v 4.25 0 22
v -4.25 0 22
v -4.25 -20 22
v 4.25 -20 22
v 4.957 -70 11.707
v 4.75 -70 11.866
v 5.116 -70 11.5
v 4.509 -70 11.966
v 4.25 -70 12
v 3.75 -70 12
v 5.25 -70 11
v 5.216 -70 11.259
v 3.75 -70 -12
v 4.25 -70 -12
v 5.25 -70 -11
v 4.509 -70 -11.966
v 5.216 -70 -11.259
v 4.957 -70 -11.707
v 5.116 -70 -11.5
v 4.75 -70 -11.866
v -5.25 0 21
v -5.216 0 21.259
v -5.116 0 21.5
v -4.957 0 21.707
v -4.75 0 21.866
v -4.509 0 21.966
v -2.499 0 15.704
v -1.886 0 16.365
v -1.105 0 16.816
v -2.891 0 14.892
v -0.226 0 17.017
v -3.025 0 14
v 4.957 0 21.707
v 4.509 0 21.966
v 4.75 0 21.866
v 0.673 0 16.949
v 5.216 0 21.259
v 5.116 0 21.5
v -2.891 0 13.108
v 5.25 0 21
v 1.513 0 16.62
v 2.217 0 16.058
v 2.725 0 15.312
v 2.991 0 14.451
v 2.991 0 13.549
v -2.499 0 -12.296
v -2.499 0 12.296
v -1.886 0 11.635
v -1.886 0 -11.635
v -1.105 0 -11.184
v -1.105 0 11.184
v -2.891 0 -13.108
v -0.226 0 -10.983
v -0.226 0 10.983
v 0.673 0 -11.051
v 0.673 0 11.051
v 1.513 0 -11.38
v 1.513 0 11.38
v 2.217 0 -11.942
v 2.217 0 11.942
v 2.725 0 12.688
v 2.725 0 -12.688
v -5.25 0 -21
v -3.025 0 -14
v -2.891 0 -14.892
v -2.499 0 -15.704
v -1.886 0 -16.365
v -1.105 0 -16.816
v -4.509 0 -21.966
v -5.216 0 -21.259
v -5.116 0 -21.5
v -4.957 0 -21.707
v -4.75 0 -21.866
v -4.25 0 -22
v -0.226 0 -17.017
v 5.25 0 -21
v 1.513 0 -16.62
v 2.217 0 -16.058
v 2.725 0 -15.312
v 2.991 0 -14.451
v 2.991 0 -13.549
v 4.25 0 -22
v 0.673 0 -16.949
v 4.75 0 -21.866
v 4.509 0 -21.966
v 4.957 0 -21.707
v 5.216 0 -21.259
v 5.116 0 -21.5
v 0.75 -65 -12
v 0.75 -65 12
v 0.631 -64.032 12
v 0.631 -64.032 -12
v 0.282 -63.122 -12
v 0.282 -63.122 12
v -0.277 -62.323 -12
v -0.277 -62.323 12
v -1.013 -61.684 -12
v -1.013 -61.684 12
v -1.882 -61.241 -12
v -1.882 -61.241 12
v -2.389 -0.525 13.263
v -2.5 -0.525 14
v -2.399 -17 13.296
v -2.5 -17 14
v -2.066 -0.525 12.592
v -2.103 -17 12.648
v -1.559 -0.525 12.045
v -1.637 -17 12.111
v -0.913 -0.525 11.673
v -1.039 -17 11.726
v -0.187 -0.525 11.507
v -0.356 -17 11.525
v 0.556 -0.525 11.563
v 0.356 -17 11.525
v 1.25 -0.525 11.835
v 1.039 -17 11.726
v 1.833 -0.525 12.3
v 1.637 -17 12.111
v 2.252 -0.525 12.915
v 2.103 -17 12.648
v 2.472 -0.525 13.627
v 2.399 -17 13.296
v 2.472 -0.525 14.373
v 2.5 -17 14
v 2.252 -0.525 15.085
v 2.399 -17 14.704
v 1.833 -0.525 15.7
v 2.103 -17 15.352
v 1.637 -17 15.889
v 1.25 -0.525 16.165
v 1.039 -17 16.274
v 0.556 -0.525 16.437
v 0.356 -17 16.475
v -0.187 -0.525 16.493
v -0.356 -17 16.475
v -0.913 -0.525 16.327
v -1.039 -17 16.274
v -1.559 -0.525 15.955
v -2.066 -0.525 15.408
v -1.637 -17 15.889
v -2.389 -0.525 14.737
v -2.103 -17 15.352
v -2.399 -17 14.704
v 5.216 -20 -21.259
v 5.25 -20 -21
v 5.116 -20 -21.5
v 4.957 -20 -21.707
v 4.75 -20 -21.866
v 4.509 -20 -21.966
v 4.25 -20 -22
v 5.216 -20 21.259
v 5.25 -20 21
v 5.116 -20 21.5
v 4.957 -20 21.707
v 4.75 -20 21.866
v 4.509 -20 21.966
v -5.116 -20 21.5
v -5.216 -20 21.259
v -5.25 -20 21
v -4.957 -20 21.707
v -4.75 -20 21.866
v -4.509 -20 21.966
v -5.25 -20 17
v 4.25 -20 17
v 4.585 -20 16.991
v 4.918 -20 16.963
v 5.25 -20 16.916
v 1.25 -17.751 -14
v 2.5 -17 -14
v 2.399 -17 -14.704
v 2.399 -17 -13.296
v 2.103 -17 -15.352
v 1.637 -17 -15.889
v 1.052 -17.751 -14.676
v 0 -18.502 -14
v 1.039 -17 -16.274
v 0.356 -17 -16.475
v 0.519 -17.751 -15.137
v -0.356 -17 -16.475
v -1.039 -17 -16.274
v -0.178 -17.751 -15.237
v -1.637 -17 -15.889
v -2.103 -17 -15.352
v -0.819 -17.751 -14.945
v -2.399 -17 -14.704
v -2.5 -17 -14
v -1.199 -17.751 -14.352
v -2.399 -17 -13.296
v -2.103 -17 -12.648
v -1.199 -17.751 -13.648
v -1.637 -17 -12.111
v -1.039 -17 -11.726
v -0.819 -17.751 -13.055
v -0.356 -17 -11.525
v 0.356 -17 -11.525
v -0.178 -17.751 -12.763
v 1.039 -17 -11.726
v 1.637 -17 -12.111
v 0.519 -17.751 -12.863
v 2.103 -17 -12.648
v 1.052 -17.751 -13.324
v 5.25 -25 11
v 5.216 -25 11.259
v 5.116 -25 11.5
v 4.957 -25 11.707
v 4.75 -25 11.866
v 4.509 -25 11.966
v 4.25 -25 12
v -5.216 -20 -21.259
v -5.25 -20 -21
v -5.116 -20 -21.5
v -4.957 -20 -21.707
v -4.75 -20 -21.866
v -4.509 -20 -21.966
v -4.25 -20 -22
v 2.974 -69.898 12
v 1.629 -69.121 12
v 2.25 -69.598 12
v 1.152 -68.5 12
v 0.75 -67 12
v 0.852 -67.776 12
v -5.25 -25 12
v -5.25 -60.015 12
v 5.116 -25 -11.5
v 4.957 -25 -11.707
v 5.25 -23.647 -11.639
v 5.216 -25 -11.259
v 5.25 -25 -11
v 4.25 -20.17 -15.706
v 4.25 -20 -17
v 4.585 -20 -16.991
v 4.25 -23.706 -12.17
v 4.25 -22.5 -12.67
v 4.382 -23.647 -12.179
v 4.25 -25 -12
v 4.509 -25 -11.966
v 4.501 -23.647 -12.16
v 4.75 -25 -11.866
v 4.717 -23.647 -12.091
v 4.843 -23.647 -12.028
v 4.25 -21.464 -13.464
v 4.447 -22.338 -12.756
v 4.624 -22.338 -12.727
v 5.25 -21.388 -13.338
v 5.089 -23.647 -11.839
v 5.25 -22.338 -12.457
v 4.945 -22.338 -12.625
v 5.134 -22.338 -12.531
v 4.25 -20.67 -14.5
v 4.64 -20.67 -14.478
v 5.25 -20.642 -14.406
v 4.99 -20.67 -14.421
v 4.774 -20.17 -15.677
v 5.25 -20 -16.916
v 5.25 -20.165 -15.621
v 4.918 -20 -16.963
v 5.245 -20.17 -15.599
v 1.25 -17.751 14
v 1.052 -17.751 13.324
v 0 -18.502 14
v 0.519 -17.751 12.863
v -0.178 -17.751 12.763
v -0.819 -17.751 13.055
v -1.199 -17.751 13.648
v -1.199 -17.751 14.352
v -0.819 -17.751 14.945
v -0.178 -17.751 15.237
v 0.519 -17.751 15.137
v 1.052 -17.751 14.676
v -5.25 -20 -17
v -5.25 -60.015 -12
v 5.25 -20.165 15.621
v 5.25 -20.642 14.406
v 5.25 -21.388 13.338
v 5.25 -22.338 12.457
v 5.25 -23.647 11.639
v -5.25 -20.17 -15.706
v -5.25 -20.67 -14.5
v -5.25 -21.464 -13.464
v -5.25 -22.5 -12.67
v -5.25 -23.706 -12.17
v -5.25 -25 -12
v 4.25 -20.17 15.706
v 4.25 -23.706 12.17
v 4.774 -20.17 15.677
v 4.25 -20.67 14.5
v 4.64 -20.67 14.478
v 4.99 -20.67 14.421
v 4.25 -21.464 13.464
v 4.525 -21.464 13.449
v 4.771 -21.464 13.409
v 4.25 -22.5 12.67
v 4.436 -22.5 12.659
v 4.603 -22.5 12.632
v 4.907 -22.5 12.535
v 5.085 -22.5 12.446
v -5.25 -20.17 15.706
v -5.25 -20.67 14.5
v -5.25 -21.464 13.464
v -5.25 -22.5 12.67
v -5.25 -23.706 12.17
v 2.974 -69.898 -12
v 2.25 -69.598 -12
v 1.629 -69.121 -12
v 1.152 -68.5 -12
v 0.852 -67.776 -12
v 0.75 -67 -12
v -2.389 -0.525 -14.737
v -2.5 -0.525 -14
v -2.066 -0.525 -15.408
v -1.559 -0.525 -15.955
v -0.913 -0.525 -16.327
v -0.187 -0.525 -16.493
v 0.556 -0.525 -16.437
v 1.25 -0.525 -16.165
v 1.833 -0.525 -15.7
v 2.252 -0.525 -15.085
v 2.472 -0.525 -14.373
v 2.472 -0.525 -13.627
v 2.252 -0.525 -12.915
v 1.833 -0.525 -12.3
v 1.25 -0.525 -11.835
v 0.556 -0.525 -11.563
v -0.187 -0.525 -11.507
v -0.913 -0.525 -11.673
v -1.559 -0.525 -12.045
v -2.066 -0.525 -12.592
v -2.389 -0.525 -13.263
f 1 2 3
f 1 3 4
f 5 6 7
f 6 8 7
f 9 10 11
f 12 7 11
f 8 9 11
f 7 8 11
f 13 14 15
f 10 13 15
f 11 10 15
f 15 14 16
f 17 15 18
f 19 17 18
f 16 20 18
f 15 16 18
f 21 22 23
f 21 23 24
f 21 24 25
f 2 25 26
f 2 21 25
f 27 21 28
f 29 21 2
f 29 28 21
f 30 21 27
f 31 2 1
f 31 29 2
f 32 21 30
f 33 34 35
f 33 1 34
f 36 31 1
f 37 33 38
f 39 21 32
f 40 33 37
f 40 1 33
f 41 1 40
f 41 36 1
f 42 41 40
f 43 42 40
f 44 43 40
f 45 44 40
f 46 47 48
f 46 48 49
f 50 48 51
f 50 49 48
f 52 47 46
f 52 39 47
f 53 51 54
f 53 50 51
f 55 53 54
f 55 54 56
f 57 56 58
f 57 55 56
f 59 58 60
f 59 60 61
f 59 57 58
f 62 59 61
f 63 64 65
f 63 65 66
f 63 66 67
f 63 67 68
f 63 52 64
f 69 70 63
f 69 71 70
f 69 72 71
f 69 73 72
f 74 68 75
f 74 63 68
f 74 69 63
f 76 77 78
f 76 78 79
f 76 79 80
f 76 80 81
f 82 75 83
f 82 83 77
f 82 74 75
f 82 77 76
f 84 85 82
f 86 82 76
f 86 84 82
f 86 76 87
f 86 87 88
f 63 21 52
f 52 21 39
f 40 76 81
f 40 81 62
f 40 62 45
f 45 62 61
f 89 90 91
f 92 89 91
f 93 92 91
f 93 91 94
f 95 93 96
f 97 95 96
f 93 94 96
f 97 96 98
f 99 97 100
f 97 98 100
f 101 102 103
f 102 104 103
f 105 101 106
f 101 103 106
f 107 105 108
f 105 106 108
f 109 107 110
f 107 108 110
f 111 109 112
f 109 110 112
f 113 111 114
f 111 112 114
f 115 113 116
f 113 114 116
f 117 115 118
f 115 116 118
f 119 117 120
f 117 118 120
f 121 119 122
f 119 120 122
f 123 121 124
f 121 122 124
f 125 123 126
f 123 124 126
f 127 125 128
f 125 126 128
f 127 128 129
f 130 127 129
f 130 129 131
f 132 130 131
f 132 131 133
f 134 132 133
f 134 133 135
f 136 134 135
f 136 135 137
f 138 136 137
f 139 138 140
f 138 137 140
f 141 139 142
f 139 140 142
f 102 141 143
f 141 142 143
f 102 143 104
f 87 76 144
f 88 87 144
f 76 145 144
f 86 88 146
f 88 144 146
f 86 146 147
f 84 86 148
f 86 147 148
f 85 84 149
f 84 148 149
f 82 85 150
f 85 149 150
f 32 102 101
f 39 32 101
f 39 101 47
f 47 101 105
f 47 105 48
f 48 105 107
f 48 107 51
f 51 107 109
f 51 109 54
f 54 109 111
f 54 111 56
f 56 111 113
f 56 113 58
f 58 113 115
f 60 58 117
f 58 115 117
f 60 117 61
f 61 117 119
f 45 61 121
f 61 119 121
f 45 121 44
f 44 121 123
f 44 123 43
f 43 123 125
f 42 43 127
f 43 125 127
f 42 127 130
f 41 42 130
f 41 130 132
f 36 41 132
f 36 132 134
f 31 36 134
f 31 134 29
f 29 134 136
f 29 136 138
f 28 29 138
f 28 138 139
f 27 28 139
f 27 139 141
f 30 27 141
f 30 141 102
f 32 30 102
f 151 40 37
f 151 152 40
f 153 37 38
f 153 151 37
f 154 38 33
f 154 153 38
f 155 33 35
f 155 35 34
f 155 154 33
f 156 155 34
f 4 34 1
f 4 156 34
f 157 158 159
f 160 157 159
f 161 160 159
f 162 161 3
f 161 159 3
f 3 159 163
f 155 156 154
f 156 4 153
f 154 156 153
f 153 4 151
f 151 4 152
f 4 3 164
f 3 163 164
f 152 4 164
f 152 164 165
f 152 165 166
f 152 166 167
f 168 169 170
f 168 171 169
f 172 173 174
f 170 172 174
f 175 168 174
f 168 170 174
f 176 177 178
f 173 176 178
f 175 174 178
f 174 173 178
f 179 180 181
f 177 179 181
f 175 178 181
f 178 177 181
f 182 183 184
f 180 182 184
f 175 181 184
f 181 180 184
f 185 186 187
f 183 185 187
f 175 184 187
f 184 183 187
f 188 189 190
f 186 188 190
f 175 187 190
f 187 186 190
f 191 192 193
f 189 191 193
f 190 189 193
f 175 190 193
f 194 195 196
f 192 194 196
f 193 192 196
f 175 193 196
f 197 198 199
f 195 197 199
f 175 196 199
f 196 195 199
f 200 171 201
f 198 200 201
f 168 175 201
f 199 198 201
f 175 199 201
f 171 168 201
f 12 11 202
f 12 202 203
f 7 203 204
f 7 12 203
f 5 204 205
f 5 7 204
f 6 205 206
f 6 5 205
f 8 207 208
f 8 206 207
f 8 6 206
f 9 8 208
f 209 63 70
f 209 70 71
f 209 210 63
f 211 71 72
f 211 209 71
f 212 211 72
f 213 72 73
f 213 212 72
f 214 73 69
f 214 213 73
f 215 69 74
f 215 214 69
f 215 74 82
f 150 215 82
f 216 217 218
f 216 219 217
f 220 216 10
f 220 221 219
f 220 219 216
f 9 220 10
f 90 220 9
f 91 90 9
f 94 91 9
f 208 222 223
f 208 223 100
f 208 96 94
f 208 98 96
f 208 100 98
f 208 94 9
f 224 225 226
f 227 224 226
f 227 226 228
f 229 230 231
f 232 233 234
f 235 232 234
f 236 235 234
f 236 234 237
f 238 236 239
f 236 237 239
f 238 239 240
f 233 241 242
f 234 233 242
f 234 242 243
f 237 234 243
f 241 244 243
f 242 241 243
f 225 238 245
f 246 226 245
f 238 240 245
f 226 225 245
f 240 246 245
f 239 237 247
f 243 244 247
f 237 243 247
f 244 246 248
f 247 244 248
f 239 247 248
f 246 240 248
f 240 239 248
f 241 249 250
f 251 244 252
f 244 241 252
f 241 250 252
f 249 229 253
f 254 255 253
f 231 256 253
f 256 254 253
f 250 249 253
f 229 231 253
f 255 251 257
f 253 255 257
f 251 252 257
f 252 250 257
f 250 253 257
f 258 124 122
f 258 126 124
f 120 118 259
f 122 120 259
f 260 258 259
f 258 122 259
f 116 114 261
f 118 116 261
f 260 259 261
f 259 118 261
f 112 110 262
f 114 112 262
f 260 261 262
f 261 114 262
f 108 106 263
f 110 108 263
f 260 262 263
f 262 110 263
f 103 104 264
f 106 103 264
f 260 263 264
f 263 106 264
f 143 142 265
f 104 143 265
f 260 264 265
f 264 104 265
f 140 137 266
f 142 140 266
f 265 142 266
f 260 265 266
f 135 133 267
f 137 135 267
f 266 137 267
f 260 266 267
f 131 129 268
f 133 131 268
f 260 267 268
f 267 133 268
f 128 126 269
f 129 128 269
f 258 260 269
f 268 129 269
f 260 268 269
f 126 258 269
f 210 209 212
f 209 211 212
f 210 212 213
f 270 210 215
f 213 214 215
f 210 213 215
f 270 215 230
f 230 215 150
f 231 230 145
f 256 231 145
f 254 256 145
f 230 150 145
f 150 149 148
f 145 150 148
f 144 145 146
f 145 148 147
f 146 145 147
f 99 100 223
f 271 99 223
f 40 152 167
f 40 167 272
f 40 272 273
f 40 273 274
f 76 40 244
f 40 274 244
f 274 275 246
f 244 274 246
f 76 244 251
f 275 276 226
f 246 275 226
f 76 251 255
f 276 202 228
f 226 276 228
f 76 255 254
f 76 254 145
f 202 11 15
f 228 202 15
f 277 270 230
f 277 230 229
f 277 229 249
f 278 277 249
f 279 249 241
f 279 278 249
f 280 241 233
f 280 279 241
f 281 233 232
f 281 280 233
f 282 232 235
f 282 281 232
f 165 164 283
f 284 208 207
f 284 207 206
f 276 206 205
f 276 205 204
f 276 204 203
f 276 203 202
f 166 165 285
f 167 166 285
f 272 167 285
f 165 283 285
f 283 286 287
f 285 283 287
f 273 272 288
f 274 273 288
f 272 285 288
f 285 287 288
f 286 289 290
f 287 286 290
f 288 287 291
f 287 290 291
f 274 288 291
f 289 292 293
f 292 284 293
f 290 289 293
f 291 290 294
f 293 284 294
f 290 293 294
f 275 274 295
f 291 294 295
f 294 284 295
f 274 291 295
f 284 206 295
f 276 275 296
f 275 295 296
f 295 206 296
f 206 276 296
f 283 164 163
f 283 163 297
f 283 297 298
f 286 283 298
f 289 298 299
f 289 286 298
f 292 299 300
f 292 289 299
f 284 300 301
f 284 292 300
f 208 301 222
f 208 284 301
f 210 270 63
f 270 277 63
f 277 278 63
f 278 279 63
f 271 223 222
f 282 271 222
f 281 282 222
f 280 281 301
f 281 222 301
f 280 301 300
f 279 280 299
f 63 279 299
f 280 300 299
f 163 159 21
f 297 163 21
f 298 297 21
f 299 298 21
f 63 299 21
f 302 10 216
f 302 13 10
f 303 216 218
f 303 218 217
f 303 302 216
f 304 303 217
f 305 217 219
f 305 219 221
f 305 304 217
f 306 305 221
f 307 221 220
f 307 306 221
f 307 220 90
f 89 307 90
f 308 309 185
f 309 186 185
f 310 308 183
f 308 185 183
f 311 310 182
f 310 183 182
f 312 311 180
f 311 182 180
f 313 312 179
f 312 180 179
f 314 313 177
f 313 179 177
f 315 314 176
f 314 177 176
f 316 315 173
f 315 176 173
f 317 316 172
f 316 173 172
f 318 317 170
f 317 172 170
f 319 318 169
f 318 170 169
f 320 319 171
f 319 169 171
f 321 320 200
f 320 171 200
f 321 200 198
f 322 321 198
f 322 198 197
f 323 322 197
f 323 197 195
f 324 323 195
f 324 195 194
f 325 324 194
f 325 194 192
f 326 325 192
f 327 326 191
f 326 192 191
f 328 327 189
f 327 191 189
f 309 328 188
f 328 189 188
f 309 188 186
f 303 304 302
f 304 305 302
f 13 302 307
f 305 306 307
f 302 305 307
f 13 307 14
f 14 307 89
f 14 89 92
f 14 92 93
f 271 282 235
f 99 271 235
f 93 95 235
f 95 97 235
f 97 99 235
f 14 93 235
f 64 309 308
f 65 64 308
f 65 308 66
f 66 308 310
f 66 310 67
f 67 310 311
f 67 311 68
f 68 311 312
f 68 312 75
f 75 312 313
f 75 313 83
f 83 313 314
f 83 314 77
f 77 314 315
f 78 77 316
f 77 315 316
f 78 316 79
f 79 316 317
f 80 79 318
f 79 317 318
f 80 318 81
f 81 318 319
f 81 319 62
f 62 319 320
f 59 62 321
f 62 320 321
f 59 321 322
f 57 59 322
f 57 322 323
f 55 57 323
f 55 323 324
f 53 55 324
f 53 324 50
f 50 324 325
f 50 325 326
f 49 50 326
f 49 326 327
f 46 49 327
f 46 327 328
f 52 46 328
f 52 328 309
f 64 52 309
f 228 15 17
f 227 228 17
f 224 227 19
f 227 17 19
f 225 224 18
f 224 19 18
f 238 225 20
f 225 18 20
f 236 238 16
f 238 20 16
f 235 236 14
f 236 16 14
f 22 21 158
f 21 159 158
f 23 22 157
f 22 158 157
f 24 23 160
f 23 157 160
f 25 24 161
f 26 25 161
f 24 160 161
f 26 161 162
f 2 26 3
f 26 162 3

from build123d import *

# Parameters (mm, degrees)
SKETCH1_W                   = 10.5
SKETCH1_H                   = 24
BOSS_EXTRUDE1_DEPTH         = 70
CUT_EXTRUDE1_REACH          = 76.186
FILLET1_R                   = 3
SKETCH3_W                   = 10.5
SKETCH3_H                   = 44
BOSS_EXTRUDE2_DEPTH         = 20
FILLET2_R                   = 1
M6_TAPPED_HOLE1_D           = 5
M6_TAPPED_HOLE1_DEPTH       = 17
M6_TAPPED_HOLE1_CSINK_D     = 6.05
M6_TAPPED_HOLE1_CSINK_ANGLE = 90
M6_TAPPED_HOLE1_TIP         = 1.502151548
FILLET3_R                   = 5
FILLET4_R                   = 1


with BuildPart() as part:
    # Sketch1 → Boss-Extrude1 (new body)
    with BuildSketch(Plane(origin=(0, 0, 0), x_dir=(1, 0, 0), z_dir=(0, 1, 0))):
        Rectangle(SKETCH1_W, SKETCH1_H)
    extrude(amount=-BOSS_EXTRUDE1_DEPTH)

    # Sketch2 → Cut-Extrude1 (cut, up to next)
    with BuildSketch(Plane.XY.offset(12), mode=Mode.PRIVATE) as cut_extrude1_sk1:
        with BuildLine():
            Line((-1.881919427, -61.241229517), (-5.25, -60.015348442))
            Line((-5.25, -60.015348442), (-5.25, -70))
            Line((-5.25, -70), (0.75, -70))
            Line((0.75, -70), (0.75, -65))
            ThreePointArc((0.75, -65), (0.026608177, -62.705694255), (-1.881919427, -61.241229517))
        make_face()
    cut_extrude1_tool1 = extrude(cut_extrude1_sk1.sketch, amount=-CUT_EXTRUDE1_REACH, mode=Mode.PRIVATE) & part.part
    add(cut_extrude1_tool1.solids().sort_by_distance((-2.443278, -65.612177, 12))[0], mode=Mode.SUBTRACT)

    # Fillet1
    fillet1_edges = [part.edges().sort_by_distance(p)[0] for p in [
        (0.75, -70, 0),
    ]]
    fillet(fillet1_edges, radius=FILLET1_R)

    # Sketch3 → Boss-Extrude2 (add)
    with BuildSketch(Plane(origin=(0, 0, 0), x_dir=(1, 0, 0), z_dir=(0, 1, 0))):
        Rectangle(SKETCH3_W, SKETCH3_H)
    extrude(amount=-BOSS_EXTRUDE2_DEPTH)

    # Fillet2
    fillet2_edges = [part.edges().sort_by_distance(p)[0] for p in [
        (5.25, -45, 12),
        (5.25, -45, -12),
    ]]
    fillet(fillet2_edges, radius=FILLET2_R)

    # M6 Tapped Hole1
    with Locations(Plane(origin=(0, 0, 0), x_dir=(1, 0, 0), z_dir=(0, 1, 0))):
        with Locations((0, 14), (0, -14)):
            CounterSinkHole(M6_TAPPED_HOLE1_D / 2, M6_TAPPED_HOLE1_CSINK_D / 2, depth=M6_TAPPED_HOLE1_DEPTH, counter_sink_angle=M6_TAPPED_HOLE1_CSINK_ANGLE)
            with Locations((0, 0, -(M6_TAPPED_HOLE1_DEPTH + M6_TAPPED_HOLE1_TIP / 2))):  # 118° drill point
                Cone(0, M6_TAPPED_HOLE1_D / 2, M6_TAPPED_HOLE1_TIP, mode=Mode.SUBTRACT)

    # Fillet3
    # the kernel refuses this fillet: 5 mm, written as the material it adds along each edge
    with BuildSketch(Plane(origin=(4.25, -20, 12), x_dir=(0, -1, 0), z_dir=(-1, 0, 0)), Plane(origin=(-5.25, -20, -12), x_dir=(0, -1, 0), z_dir=(1, 0, 0))) as fillet3_piece_1:
        with BuildLine():
            CenterArc((FILLET3_R, FILLET3_R), FILLET3_R, 180, 90)
            Line((0, FILLET3_R), (0, 0))
            Line((0, 0), (FILLET3_R, 0))
        make_face()
    extrude(amount=9.5)
    with BuildSketch(Plane(origin=(4.25, -20, -11), x_dir=(0, 0, -1), z_dir=(-1, 0, 0))) as fillet3_piece_2_section:
        with BuildLine():
            CenterArc((1 + FILLET3_R, FILLET3_R), FILLET3_R, 180, 90)
            Line((1, FILLET3_R), (1, 0))
            Line((1, 0), (1 + FILLET3_R, 0))
        make_face()
    fillet3_piece_2 = revolve(axis=Axis((4.25, -20, -11), (0, -1, 0)), revolution_arc=359.64, mode=Mode.PRIVATE)
    fillet3_piece_2 = split(fillet3_piece_2, bisect_by=Plane(origin=(5.25, -21.017365057, -13.137521002), z_dir=(-1, 0, 0)), keep=Keep.TOP, mode=Mode.PRIVATE)
    add(fillet3_piece_2)
    with BuildSketch(Plane(origin=(4.25, -20, 11), x_dir=(0, 0, 1), z_dir=(-1, 0, 0))) as fillet3_piece_3_section:
        with BuildLine():
            CenterArc((1 + FILLET3_R, -FILLET3_R), FILLET3_R, 90, 90)
            Line((1 + FILLET3_R, 0), (1, 0))
            Line((1, 0), (1, -FILLET3_R))
        make_face()
    fillet3_piece_3 = revolve(axis=Axis((4.25, -20, 11), (0, 1, 0)), revolution_arc=359.64, mode=Mode.PRIVATE)
    fillet3_piece_3 = split(fillet3_piece_3, bisect_by=Plane(origin=(5.25, -22.017645533, 11.767475003), z_dir=(-1, 0, 0)), keep=Keep.TOP, mode=Mode.PRIVATE)
    add(fillet3_piece_3)

    # Fillet4
    fillet4_edges = [part.edges().sort_by_distance(p)[0] for p in [
        (-5.25, -10, 22),
        (-5.25, -10, -22),
        (5.25, -10, -22),
        (5.25, -10, 22),
    ]]
    fillet(fillet4_edges, radius=FILLET4_R)


solid = part.part
